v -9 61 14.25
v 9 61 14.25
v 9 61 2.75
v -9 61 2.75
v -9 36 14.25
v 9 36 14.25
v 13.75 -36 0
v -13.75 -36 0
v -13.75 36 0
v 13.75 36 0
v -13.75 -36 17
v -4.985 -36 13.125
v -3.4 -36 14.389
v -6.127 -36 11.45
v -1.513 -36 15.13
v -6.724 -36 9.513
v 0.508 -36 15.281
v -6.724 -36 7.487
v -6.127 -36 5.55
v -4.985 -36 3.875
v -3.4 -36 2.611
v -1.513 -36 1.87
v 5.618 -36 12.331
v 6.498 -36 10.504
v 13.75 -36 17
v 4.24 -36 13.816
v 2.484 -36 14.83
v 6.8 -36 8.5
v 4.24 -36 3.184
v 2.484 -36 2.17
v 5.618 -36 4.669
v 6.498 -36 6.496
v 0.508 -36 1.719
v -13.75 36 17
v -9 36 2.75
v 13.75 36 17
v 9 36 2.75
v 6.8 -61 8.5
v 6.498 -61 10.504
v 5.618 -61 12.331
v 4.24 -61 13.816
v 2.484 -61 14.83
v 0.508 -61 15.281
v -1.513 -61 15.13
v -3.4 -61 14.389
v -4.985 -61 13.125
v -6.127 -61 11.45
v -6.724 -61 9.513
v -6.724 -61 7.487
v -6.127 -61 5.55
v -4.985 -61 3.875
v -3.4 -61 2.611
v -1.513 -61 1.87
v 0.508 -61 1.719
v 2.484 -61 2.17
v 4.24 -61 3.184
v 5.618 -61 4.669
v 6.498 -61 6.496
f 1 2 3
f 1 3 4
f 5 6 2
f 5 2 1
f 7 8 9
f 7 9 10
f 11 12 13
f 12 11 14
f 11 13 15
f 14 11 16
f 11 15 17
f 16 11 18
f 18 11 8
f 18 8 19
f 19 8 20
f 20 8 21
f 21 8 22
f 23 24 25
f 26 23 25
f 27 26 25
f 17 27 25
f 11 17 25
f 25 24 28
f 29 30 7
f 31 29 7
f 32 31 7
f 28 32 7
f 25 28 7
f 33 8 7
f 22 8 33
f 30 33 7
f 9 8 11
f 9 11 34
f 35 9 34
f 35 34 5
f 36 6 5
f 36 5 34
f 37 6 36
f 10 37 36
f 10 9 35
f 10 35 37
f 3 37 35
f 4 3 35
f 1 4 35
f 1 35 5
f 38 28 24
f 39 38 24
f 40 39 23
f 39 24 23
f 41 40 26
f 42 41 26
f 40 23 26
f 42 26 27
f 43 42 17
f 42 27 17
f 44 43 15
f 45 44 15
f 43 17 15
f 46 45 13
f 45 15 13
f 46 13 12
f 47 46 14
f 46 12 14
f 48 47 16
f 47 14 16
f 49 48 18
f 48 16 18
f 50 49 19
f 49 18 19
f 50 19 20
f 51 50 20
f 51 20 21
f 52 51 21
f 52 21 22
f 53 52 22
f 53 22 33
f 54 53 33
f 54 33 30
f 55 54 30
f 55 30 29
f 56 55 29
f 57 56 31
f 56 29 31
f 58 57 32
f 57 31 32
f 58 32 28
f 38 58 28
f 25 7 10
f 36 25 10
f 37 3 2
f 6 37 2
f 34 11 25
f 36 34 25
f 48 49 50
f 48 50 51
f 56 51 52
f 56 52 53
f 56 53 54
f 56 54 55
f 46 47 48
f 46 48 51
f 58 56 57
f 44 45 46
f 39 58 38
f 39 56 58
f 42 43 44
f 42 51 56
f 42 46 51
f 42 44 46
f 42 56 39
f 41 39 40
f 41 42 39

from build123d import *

# Parameters (mm, degrees)
F0_W     = 27.5
F0_H     = 72
F1_DEPTH = 17
F2_W     = 18
F2_H     = 11.5
F3_DEPTH = 25
F4_R     = 6.8
F5_DEPTH = 25


with BuildPart() as f1:
    # F0 (on Top) → F1 (new body)
    with BuildSketch(Plane.XY):
        Rectangle(F0_W, F0_H)
    extrude(amount=F1_DEPTH)

    # F2 (on face) → F3 (join)
    with BuildSketch(Plane(origin=(0, 36, 0), x_dir=(-1, 0, 0), z_dir=(0, 1, 0))):
        with Locations((0, 8.5)):
            Rectangle(F2_W, F2_H)
    extrude(amount=F3_DEPTH)

    # F4 (on face) → F5 (join)
    with BuildSketch(Plane.XZ.offset(36)):
        with Locations((0, 8.5)):
            Circle(F4_R)
    extrude(amount=F5_DEPTH)


solid = f1.part
